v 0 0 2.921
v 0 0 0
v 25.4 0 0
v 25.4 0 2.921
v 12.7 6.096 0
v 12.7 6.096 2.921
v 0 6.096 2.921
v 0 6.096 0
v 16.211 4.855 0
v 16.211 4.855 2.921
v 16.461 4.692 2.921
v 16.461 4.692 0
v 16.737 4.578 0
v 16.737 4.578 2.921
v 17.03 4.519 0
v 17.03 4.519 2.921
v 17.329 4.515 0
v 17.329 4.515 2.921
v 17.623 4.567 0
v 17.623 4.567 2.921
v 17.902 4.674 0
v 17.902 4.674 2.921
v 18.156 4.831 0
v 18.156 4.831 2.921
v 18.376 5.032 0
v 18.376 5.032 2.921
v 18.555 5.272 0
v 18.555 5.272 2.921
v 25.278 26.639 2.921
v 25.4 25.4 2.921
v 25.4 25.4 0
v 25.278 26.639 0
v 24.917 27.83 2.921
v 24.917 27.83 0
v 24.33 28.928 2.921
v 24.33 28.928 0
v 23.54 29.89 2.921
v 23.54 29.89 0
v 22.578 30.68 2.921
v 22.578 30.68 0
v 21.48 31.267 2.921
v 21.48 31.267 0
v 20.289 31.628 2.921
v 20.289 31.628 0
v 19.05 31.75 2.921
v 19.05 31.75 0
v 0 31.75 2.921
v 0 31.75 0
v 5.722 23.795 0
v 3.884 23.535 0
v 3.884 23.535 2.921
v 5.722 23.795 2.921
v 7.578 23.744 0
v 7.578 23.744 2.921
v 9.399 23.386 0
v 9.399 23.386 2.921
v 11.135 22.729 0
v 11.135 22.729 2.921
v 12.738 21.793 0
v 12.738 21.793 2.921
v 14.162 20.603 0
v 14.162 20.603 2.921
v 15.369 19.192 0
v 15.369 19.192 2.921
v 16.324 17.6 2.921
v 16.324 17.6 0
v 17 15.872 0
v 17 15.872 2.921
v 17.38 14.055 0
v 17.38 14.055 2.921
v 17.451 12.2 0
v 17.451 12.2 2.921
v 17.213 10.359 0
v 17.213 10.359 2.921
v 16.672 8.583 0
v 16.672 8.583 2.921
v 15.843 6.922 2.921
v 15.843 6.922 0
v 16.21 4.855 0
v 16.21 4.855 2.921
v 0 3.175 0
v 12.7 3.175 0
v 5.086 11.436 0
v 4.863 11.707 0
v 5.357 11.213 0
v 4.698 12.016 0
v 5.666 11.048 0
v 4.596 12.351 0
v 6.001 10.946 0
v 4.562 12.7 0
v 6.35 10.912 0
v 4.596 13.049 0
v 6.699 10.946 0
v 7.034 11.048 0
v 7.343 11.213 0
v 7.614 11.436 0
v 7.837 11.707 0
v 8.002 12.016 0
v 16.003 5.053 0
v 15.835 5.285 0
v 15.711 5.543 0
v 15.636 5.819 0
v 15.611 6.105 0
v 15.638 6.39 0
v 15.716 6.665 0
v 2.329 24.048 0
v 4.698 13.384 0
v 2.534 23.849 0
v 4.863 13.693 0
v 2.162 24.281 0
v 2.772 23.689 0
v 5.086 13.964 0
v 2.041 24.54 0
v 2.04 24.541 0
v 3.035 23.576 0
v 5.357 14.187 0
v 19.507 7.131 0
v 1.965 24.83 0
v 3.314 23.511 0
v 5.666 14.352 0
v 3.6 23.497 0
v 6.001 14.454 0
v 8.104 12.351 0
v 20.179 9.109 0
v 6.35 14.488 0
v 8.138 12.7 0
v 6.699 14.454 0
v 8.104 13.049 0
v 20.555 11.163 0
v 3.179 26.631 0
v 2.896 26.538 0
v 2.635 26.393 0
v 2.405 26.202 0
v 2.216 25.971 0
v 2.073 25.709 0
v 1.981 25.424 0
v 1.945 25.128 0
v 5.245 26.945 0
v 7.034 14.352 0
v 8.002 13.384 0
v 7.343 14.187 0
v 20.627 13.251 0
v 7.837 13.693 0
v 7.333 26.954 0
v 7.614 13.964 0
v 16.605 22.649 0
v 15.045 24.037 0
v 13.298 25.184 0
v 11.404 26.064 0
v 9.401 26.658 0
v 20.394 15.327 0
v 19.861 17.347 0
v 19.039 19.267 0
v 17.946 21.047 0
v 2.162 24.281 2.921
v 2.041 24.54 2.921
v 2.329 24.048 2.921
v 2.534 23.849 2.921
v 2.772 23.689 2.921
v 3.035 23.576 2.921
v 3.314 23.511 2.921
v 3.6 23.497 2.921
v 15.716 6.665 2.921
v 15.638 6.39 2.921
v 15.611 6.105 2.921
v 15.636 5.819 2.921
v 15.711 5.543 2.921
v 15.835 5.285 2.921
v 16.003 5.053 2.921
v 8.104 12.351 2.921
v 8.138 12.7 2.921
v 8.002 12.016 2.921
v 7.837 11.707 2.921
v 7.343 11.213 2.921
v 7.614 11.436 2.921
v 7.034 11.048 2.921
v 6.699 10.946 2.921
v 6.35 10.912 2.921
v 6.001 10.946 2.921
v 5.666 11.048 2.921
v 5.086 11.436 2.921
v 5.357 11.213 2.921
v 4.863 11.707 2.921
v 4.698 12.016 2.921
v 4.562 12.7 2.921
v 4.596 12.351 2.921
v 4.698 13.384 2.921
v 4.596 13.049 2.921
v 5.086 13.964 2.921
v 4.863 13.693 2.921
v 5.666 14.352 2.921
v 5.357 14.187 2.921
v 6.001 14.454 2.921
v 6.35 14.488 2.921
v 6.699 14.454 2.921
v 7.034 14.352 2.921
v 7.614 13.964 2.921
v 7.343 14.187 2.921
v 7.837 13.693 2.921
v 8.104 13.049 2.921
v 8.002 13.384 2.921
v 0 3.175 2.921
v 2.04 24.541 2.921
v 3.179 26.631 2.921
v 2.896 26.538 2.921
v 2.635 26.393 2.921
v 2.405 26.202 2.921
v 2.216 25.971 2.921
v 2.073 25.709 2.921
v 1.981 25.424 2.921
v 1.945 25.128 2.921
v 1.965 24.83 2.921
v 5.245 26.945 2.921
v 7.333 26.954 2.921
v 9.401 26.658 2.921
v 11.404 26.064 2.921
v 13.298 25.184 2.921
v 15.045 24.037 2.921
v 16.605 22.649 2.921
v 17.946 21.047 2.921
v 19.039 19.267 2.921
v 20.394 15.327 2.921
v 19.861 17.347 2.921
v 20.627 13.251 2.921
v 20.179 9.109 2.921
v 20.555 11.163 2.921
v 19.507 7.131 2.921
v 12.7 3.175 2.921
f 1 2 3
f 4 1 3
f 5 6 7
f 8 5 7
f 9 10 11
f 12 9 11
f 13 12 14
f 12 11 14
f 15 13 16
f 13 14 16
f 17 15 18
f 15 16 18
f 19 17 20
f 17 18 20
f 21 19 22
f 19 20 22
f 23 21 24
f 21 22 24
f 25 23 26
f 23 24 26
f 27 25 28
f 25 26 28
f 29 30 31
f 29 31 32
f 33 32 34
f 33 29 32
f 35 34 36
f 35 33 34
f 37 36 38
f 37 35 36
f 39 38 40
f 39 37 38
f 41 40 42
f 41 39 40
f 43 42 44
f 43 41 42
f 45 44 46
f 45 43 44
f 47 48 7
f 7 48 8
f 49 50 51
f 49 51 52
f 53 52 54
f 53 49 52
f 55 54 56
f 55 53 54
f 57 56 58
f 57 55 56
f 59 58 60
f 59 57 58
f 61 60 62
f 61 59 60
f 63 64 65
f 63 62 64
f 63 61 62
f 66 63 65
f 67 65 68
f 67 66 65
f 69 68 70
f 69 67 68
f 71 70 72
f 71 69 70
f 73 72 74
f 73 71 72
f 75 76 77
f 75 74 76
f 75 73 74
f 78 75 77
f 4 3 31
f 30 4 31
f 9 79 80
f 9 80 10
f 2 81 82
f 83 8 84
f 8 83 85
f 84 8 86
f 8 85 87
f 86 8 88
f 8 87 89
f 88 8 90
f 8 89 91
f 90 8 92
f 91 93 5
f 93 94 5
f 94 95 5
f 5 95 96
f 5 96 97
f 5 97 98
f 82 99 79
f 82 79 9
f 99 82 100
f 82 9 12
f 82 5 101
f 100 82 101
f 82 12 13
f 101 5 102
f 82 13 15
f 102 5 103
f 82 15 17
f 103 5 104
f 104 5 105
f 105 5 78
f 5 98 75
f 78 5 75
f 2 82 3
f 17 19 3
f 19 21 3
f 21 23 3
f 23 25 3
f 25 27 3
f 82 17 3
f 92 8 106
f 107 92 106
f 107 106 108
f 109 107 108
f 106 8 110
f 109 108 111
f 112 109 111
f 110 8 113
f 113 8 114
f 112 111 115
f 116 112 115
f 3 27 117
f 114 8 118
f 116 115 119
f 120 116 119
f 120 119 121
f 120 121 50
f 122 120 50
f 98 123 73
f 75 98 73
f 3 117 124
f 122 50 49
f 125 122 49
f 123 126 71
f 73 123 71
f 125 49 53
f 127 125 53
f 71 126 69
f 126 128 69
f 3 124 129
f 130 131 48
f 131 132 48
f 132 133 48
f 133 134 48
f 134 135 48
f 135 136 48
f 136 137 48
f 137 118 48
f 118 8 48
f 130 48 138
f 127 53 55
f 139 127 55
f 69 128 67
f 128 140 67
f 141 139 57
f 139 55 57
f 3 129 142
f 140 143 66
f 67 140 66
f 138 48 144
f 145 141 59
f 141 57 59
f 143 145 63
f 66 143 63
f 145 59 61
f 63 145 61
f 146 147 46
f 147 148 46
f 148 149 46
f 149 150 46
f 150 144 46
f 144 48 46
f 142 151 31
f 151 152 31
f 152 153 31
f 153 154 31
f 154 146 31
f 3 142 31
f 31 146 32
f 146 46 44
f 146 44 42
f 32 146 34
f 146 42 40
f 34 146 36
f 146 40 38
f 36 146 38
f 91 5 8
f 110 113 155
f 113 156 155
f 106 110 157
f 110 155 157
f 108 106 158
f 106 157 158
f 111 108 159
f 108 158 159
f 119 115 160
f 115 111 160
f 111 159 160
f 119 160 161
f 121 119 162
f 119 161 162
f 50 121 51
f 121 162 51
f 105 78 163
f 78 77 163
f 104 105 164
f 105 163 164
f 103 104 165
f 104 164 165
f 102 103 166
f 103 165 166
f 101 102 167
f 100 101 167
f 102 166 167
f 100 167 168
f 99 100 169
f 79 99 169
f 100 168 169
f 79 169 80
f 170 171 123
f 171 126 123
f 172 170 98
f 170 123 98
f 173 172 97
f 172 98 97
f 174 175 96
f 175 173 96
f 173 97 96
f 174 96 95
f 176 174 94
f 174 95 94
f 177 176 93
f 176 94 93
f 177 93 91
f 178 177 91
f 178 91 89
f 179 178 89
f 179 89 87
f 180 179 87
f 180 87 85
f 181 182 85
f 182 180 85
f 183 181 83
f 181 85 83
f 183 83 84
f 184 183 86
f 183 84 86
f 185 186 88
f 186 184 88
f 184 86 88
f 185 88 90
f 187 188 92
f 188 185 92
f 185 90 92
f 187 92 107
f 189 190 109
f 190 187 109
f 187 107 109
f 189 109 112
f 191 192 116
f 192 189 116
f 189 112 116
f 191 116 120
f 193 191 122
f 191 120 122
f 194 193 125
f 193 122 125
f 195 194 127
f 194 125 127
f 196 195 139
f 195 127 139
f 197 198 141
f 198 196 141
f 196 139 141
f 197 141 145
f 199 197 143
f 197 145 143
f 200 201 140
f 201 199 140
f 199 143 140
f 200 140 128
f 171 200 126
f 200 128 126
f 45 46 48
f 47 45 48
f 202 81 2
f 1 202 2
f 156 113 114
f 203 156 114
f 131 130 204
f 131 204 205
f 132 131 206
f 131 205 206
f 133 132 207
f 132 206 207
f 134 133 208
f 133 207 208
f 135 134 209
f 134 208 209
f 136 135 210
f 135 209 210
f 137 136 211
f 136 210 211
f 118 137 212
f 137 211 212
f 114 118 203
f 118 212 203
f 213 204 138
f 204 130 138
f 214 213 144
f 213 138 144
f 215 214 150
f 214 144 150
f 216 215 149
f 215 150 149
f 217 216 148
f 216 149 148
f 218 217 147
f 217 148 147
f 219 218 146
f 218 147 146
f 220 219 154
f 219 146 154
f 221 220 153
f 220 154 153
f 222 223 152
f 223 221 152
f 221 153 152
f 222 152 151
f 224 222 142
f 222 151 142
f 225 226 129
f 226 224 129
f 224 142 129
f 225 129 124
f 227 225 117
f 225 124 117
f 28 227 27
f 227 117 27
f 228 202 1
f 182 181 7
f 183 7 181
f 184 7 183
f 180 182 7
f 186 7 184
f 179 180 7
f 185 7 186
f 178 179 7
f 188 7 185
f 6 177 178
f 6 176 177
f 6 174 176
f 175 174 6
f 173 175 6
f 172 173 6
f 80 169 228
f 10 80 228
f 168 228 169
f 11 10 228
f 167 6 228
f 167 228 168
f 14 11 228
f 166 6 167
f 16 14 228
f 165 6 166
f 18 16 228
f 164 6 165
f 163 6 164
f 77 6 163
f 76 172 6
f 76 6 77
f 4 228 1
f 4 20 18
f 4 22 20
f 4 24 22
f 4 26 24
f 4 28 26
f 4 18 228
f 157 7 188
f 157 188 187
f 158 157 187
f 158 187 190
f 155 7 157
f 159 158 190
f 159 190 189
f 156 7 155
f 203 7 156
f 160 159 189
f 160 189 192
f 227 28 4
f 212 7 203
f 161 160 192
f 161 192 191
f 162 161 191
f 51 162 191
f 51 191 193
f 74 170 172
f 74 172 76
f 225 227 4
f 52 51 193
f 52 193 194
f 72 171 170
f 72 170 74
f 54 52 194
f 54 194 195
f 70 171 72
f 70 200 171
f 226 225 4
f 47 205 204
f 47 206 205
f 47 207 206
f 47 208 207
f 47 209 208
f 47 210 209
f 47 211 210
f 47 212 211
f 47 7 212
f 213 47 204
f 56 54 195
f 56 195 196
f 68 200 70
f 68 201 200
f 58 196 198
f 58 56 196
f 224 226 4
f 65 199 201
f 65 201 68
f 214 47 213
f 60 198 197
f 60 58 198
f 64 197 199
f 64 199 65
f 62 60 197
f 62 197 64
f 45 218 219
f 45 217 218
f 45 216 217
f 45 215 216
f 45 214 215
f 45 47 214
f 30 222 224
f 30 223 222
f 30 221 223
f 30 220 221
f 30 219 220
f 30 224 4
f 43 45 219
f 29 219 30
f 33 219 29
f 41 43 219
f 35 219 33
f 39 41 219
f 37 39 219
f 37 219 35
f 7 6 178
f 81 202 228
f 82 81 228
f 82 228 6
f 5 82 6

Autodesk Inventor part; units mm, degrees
ref_plane "YZ Plane" through (0, 0, 0) normal (1, 0, 0) x (0, 1, 0)
ref_plane "XZ Plane" through (0, 0, 0) normal (0, 1, 0) x (-1, 0, 0)
ref_plane "XY Plane" through (0, 0, 0) normal (0, 0, 1) x (1, 0, 0)
sketch "Sketch1" plane through (0, 0, 0) normal (0, 0, 1) x (1, 0, 0)
  line L0 (0, 0) -> (25.4, 0)
  line L1 (25.4, 0) -> (25.4, 31.75)
  line L2 (25.4, 31.75) -> (0, 31.75)
  line L3 (0, 31.75) -> (0, 0)
  circle A0 centre (6.35, 12.7) radius 1.7882
  arc A1 (16.2884, 4.7932) -> (2.0063, 24.6341) centre (6.35, 12.7) ccw construction
  line L4 (2.5493, 23.1423) -> (1.4634, 26.1259)
  line L5 (6.35, 12.7) -> (20.6125, 12.7) construction
  arc A2 (15.0461, 5.7815) -> (2.5493, 23.1423) centre (6.35, 12.7) ccw
  arc A3 (17.5307, 3.8048) -> (1.4634, 26.1259) centre (6.35, 12.7) ccw
  line L6 (15.0461, 5.7815) -> (17.5307, 3.8048)
  dimension "d0" = 12.7
  dimension "d1" = 31.75
  dimension "d2" = 6.35
  dimension "d3" = 110
  dimension "d4" = 25.4
  dimension "d5" = 1.5875
  dimension "d6" = 1.5875
  dimension "d10" = 25.4
extrude "Extrusion1" add sketch "Sketch1" along normal blind 2.921
fillet "Fillet1" radius 1.5875 4 edges at (15.0461, 5.7815, 1.4605) (17.5307, 3.8048, 1.4605) (1.4634, 26.1259, 1.4605) (2.5493, 23.1423, 1.4605)
sketch "Sketch2" plane through (0, 0, 2.921) normal (0, 0, 1) x (1, 0, 0)
  line L0 (0, 3.175) -> (12.7, 3.175)
  line L1 (12.7, 3.175) -> (12.7, 6.096)
  line L2 (12.7, 6.096) -> (0, 6.096)
  line L3 (0, 6.096) -> (0, 3.175)
  line L4 (0, 0) -> (25.4, 0) projected
  line L5 (0, 31.75) -> (0, 0) projected
  dimension "d11" = 2.921
  dimension "d12" = 12.7
  dimension "d13" = 3.175
  dimension "d14" = 0
extrude "Extrusion2" cut sketch "Sketch2" against normal blind 6.604
fillet "Fillet2" radius 6.35 1 edges at (25.4, 31.75, 1.4605)
properties part number "Angleframe"
